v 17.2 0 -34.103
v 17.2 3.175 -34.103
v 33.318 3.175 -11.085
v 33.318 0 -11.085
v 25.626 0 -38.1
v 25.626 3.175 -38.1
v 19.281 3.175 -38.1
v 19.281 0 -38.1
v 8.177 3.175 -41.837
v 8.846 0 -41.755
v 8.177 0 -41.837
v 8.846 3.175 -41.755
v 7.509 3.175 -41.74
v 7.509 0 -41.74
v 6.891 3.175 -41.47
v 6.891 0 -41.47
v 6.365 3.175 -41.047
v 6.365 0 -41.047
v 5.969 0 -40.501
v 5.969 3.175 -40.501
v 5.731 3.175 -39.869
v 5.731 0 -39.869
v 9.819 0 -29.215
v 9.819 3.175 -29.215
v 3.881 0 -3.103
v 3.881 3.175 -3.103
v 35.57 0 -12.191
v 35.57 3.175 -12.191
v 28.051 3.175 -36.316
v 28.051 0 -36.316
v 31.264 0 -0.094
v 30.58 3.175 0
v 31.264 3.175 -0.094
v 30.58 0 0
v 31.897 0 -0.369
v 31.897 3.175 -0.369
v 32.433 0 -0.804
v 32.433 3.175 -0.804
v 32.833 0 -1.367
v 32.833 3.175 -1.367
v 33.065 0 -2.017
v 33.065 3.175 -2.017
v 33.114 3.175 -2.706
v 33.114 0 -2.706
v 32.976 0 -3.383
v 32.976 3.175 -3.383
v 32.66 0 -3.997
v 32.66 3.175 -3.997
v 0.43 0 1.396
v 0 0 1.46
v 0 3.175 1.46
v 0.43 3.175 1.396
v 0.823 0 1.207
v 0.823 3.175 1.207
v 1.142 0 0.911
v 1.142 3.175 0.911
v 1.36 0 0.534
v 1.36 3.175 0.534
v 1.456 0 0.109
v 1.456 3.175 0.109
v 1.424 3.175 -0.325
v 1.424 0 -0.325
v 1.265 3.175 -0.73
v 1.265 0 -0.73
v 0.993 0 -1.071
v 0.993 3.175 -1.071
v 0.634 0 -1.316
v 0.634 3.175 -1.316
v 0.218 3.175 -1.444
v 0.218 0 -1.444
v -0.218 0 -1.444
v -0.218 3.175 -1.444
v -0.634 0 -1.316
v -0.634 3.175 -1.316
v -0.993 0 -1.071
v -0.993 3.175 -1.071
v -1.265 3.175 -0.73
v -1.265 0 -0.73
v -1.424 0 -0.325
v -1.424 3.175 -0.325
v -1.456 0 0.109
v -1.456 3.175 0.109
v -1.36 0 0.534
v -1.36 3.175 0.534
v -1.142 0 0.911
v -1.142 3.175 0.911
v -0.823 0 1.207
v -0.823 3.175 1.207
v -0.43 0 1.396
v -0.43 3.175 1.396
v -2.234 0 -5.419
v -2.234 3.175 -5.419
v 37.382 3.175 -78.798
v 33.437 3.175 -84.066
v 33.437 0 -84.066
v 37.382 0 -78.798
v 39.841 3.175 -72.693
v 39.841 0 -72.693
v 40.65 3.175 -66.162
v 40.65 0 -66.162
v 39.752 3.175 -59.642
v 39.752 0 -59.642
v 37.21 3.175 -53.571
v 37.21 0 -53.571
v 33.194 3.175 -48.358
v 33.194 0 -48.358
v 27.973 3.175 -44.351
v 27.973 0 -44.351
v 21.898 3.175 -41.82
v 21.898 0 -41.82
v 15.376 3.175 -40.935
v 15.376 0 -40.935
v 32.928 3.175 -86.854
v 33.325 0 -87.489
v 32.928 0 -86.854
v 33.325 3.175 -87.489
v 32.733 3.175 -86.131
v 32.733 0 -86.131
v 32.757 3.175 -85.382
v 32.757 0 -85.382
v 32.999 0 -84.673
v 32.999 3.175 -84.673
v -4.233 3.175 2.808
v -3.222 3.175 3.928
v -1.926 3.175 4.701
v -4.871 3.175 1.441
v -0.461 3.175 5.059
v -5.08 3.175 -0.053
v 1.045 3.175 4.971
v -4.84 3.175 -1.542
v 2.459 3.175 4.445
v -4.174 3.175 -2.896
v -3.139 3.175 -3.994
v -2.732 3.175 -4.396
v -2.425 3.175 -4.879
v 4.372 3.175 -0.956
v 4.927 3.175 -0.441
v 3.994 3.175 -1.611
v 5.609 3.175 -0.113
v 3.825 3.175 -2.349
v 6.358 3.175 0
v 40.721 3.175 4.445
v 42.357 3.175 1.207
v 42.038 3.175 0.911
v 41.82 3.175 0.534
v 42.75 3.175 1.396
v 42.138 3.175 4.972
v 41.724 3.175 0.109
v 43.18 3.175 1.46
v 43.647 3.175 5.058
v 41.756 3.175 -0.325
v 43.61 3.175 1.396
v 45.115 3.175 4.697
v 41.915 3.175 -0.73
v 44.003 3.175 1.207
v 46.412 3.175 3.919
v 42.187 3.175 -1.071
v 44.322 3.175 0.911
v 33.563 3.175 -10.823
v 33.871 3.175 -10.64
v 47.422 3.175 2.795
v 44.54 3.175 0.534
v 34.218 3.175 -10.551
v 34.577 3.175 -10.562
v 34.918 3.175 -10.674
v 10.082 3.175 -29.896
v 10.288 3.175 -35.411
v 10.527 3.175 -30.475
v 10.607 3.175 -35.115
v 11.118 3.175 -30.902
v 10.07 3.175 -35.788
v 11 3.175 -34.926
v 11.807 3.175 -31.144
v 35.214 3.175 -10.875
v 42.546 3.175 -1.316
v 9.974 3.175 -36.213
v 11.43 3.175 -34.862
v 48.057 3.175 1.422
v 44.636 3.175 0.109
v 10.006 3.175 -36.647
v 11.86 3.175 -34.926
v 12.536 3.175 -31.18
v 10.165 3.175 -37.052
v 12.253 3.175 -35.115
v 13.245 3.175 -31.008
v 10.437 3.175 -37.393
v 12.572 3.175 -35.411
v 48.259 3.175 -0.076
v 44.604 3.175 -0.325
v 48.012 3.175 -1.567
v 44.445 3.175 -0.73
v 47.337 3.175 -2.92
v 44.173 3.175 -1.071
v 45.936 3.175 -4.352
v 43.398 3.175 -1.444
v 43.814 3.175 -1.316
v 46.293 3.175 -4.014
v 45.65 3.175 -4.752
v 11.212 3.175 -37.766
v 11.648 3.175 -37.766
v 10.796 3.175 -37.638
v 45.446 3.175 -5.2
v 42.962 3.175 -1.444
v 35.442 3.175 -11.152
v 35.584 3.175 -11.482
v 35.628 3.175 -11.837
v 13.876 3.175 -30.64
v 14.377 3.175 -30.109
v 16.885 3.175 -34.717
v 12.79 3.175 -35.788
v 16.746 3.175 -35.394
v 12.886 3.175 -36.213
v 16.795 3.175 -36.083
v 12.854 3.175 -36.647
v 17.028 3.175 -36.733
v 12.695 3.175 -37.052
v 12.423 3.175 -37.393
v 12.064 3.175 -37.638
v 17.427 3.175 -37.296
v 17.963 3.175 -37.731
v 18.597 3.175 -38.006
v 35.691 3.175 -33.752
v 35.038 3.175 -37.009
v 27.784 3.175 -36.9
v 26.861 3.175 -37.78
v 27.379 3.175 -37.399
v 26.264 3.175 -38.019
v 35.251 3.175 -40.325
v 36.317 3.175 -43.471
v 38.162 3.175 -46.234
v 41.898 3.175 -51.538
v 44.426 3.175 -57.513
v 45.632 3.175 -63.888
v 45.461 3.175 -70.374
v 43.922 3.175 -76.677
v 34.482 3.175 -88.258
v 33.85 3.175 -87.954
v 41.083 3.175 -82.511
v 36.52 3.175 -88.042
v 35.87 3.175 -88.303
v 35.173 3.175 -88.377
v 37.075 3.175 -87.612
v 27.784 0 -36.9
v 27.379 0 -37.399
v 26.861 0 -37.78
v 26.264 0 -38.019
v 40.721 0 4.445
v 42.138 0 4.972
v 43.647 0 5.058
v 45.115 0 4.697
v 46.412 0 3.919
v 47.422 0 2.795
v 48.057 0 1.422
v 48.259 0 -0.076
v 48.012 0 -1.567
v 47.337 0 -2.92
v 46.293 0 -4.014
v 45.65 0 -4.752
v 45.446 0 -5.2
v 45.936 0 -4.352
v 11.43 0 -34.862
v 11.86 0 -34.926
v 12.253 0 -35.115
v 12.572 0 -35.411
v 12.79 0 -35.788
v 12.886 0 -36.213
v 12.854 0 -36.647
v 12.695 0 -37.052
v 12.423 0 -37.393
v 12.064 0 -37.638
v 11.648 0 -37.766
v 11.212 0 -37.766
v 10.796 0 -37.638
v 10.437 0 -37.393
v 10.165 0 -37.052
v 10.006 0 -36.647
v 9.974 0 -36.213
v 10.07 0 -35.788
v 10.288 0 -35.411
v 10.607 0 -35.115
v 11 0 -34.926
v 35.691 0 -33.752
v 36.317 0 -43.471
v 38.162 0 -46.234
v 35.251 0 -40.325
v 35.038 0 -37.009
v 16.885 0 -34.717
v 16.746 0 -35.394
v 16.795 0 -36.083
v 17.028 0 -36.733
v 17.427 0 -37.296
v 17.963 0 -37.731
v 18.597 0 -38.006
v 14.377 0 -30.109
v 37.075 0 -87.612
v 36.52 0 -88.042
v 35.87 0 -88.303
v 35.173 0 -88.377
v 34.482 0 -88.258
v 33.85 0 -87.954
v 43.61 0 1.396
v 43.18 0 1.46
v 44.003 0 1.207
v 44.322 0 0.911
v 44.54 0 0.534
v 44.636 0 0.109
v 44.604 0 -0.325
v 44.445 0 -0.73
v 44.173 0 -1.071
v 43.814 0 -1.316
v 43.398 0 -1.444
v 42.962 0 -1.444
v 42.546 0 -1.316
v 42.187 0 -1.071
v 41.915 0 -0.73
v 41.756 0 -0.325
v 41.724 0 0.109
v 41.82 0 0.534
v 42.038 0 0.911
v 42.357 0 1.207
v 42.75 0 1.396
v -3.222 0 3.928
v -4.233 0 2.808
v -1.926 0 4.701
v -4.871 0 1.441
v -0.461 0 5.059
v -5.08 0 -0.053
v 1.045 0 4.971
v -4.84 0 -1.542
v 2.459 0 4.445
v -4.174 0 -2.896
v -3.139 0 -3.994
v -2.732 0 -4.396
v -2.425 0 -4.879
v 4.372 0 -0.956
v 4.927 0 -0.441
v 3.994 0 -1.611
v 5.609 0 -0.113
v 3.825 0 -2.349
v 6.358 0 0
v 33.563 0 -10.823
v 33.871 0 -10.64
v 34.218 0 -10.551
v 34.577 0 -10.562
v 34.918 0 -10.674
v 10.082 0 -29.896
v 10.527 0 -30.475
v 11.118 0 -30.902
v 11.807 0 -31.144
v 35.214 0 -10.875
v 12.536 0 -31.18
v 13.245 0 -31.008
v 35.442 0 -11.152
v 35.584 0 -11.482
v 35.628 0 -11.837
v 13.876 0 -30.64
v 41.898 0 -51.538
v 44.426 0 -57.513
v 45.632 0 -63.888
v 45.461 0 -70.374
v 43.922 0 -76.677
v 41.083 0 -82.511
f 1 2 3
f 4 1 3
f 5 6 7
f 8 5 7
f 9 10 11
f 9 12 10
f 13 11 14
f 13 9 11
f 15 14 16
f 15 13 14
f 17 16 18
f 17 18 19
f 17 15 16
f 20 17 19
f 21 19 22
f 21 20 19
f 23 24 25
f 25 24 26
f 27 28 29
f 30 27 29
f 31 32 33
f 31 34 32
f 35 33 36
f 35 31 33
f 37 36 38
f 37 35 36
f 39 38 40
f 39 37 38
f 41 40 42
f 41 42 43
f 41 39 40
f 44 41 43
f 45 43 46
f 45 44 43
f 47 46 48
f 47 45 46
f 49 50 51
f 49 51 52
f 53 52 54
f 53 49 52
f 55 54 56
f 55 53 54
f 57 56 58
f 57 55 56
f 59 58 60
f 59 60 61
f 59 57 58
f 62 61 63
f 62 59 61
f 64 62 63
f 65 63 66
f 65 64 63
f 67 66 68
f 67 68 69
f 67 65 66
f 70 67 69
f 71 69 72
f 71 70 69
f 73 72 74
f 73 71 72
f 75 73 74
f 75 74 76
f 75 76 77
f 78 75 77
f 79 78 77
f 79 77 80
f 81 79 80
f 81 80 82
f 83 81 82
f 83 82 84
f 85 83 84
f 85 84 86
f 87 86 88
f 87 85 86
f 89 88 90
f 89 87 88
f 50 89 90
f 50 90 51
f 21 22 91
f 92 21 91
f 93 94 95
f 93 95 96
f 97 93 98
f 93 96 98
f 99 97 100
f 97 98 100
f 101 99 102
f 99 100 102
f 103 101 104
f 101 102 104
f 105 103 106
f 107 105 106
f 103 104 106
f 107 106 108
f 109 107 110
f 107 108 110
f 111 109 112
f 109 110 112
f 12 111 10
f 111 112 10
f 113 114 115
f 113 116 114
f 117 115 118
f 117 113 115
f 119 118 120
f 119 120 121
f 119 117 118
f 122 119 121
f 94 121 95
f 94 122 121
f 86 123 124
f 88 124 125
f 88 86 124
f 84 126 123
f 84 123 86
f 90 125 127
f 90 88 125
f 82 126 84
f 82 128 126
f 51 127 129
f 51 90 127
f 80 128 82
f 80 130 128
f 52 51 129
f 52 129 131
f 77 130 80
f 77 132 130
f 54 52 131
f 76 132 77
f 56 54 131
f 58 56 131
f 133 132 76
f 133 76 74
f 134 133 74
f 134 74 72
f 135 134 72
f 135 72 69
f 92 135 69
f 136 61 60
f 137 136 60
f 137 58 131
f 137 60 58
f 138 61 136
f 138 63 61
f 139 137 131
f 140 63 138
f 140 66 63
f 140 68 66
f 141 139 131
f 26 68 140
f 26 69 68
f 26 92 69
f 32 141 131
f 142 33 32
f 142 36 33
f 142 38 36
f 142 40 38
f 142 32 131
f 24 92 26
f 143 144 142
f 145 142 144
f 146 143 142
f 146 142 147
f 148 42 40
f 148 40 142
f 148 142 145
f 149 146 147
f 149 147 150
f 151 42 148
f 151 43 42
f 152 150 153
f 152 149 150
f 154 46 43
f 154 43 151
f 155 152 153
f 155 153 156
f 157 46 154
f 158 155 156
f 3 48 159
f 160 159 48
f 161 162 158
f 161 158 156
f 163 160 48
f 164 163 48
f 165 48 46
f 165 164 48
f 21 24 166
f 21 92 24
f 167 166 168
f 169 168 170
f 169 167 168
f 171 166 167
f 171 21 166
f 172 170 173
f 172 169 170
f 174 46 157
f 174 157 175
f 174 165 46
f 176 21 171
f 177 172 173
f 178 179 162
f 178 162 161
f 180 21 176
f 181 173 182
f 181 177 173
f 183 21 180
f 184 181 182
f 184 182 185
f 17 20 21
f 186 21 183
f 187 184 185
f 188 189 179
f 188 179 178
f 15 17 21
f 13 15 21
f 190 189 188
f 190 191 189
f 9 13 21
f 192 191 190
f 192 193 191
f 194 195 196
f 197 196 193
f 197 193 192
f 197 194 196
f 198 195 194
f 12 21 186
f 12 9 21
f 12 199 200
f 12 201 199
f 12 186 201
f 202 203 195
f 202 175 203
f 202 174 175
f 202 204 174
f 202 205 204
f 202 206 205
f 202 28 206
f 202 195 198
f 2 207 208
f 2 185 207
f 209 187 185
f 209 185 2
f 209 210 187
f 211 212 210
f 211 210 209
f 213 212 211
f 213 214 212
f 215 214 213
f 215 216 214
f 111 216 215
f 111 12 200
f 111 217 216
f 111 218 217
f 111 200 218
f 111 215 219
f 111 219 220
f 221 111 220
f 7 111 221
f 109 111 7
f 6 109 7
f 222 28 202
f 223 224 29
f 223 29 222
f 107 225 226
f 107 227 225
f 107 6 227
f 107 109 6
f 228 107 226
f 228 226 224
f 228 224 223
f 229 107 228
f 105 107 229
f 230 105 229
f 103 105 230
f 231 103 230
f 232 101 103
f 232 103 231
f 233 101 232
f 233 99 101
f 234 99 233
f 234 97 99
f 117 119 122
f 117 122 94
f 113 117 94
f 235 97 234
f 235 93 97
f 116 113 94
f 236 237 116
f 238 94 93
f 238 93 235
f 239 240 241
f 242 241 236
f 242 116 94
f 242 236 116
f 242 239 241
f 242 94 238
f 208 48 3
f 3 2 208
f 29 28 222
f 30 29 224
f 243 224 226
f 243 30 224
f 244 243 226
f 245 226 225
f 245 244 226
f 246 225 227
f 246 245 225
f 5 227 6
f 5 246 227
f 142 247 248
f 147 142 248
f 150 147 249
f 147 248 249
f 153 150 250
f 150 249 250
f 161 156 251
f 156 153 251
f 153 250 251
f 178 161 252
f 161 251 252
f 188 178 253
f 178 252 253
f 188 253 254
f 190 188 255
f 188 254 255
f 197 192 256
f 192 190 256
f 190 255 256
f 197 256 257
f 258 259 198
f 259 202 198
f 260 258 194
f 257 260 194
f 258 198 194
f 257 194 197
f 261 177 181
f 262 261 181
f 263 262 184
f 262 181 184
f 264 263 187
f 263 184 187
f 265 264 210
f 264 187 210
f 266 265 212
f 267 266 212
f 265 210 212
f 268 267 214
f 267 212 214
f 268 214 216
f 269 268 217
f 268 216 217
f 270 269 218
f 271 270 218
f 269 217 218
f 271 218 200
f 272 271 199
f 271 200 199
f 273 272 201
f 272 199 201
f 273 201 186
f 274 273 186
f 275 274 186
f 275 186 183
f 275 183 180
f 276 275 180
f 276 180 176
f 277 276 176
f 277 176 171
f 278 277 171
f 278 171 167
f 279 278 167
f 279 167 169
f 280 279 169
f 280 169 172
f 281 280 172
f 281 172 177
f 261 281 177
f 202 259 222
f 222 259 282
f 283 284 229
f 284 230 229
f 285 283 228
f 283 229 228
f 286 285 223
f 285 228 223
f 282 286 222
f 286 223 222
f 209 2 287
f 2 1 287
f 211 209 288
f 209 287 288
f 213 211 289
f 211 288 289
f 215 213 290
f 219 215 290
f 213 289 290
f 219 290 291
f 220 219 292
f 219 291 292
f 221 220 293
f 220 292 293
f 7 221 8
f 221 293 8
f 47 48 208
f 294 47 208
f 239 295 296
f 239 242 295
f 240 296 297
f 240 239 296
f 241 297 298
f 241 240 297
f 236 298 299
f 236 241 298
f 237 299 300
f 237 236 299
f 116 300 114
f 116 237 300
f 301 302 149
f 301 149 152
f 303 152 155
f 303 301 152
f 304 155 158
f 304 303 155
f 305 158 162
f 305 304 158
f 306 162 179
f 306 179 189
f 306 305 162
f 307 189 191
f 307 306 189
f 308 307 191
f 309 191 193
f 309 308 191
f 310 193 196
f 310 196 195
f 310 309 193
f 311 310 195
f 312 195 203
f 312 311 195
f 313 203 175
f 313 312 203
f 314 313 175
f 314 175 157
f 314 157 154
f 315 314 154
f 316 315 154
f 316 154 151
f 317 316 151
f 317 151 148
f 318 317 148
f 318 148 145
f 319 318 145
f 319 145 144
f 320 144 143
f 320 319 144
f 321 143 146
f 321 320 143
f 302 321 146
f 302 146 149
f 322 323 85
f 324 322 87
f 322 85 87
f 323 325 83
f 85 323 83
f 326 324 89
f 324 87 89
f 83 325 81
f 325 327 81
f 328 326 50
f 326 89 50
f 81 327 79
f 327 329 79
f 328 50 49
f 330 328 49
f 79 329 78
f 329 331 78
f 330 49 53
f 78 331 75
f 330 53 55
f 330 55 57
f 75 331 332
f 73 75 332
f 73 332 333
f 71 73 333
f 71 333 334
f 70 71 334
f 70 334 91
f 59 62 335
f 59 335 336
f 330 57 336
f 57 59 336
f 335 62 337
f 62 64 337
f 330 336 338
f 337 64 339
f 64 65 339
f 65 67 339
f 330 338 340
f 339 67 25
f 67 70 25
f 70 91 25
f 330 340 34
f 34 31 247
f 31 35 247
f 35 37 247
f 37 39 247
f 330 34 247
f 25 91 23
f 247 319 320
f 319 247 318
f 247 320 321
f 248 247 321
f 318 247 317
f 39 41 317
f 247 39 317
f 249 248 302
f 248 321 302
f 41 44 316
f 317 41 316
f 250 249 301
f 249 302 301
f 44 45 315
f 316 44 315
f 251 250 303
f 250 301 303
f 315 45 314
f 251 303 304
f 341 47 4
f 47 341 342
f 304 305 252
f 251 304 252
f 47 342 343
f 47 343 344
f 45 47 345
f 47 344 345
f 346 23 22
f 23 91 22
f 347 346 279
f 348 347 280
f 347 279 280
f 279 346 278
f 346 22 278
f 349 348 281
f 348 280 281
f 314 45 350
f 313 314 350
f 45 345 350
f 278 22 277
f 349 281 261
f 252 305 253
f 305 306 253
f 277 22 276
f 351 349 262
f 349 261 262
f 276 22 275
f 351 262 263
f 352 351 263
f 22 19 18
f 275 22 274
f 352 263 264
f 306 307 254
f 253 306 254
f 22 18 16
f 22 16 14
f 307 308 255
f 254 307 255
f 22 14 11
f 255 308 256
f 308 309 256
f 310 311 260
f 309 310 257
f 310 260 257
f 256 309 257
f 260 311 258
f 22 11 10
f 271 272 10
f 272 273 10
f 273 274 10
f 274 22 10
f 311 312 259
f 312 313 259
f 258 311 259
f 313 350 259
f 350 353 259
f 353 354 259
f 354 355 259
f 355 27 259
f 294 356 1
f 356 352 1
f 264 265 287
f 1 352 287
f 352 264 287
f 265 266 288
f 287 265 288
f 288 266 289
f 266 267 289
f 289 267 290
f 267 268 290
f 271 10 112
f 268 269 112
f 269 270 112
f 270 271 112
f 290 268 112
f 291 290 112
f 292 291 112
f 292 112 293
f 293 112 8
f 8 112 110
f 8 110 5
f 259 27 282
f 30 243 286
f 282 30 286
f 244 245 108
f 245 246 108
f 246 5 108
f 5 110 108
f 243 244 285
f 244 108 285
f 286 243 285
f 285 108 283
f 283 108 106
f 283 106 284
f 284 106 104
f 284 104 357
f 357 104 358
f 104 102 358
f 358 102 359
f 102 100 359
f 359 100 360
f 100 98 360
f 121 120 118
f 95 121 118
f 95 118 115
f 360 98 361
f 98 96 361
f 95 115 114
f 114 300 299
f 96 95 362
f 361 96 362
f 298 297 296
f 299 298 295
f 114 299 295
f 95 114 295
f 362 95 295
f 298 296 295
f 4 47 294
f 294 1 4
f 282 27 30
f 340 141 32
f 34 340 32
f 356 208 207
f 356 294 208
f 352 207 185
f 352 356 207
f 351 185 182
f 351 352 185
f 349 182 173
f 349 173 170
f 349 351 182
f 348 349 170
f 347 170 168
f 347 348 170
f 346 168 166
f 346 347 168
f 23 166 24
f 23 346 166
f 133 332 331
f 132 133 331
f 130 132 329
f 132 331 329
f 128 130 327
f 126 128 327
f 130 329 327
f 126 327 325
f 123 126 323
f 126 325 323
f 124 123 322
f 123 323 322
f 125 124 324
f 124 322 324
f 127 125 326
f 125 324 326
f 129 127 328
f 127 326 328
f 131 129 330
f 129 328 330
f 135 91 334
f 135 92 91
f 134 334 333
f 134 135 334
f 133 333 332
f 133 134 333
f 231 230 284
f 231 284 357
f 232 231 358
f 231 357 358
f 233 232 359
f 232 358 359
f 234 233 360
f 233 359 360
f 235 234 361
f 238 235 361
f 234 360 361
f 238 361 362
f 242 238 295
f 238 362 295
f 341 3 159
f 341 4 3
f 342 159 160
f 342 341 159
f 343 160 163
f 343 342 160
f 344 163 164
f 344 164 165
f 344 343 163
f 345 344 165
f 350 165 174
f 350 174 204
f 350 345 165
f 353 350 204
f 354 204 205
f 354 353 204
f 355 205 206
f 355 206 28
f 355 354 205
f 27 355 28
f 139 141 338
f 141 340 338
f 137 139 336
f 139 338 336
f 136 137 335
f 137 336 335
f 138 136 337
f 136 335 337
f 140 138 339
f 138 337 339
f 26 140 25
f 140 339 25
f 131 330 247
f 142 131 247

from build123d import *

# Parameters (mm, degrees)
SKETCH1_R           = 5.08
SKETCH1_R_2         = 1.4605
BOSS_EXTRUDE1_DEPTH = 3.175
BOSS_EXTRUDE3_START = -3.175
BOSS_EXTRUDE3_DEPTH = 3.175
CUT_EXTRUDE1_DEPTH  = 25.4
FILLET4_R           = 2.54
FILLET5_R           = 12.7
FILLET6_R           = 2.54
FILLET7_R           = 1.27
SKETCH5_R           = 1.4605
CUT_EXTRUDE2_DEPTH  = 25.4


with BuildPart() as part:
    # Sketch1 → Boss-Extrude1 (new body)
    # profile 1 of 3: a face of its own
    with BuildSketch(Plane(origin=(0, 0, 0), x_dir=(1, 0, 0), z_dir=(0, 1, 0))):
        Circle(SKETCH1_R)
        with Locations(Location((0, 0, 0), (0, 0, 270))):
            Circle(SKETCH1_R_2, mode=Mode.SUBTRACT)
    # profile 2 of 3: a face of its own
    with BuildSketch(Plane(origin=(0, 0, 0), x_dir=(1, 0, 0), z_dir=(0, 1, 0))):
        with BuildLine():
            Line((40.720655575, 4.445), (2.459344425, 4.445))
            ThreePointArc((2.459344425, 4.445), (4.376063852, 2.580012628), (5.08, 0))
            ThreePointArc((5.08, 0), (4.376063852, -2.580012628), (2.459344425, -4.445))
            Line((2.459344425, -4.445), (40.720655575, -4.445))
            ThreePointArc((40.720655575, -4.445), (38.1, 0), (40.720655575, 4.445))
        make_face()
    # profile 3 of 3: a face of its own
    with BuildSketch(Plane(origin=(0, 0, 0), x_dir=(1, 0, 0), z_dir=(0, 1, 0))):
        with Locations((43.18, 0)):
            Circle(SKETCH1_R)
        with Locations(Location((43.18, 0, 0), (0, 0, 270))):
            Circle(SKETCH1_R_2, mode=Mode.SUBTRACT)
    extrude(amount=BOSS_EXTRUDE1_DEPTH)

    # Sketch3 → Boss-Extrude3 (add)
    with BuildSketch(Plane(origin=(0, 3.175, 0), x_dir=(1, 0, 0), z_dir=(0, 1, 0)).offset(BOSS_EXTRUDE3_START)):
        with BuildLine():
            Line((35.04998037, 89.507820887), (31.75, 85.645628562))
            ThreePointArc((31.75, 85.645628562), (37.132860765, 53.438748965), (6.35, 42.545))
            Line((6.35, 42.545), (-2.459344425, 4.445))
            ThreePointArc((-2.459344425, 4.445), (0, 5.08), (2.459344425, 4.445))
            Line((2.459344425, 4.445), (35.640655575, 4.445))
            Line((35.640655575, 4.445), (40.720655575, 4.445))
            ThreePointArc((40.720655575, 4.445), (43.226324552, 5.079788779), (45.72, 4.399409051))
            Line((45.72, 4.399409051), (33.02, 41.570560083))
            ThreePointArc((33.02, 41.570560083), (45.702805946, 65.04509807), (35.04998037, 89.507820887))
        make_face()
    extrude(amount=BOSS_EXTRUDE3_DEPTH)

    # Sketch4 → Cut-Extrude1 (cut)
    with BuildSketch(Plane(origin=(0, 3.175, 0), x_dir=(1, 0, 0), z_dir=(0, 1, 0))):
        Polygon((14.401426857, 38.1), (37.998834682, 4.399409051), (27.495360016, 38.1), align=None)
        Polygon((3.175, 0), (35.458834682, 0), (11.089851742, 34.802514411), align=None)
    extrude(amount=-CUT_EXTRUDE1_DEPTH, mode=Mode.SUBTRACT)

    # Fillet4
    fillet4_edges = [part.edges().sort_by_distance(p)[0] for p in [
        (11.089851742, 1.5875, -34.802514411),
        (35.458834682, 1.5875, 0),
        (3.175, 1.5875, 0),
        (14.401426857, 1.5875, -38.1),
        (27.495360016, 1.5875, -38.1),
    ]]
    fillet(fillet4_edges, radius=FILLET4_R)

    # Fillet5
    fillet5_edges = [part.edges().sort_by_distance(p)[0] for p in [
        (33.02, 1.5875, -41.570560083),
    ]]
    fillet(fillet5_edges, radius=FILLET5_R)

    # Fillet6
    fillet6_edges = [part.edges().sort_by_distance(p)[0] for p in [
        (6.35, 1.5875, -42.545),
        (35.04998037, 1.5875, -89.507820887),
        (31.75, 1.5875, -85.645628562),
        (-2.459344425, 1.5875, -4.445),
        (45.72, 1.5875, -4.399409051),
    ]]
    fillet(fillet6_edges, radius=FILLET6_R - 0.0001)  # a hair under: the kernel refuses the full size

    # Fillet7
    fillet7_edges = [part.edges().sort_by_distance(p)[0] for p in [
        (37.998834682, 1.5875, -4.399409051),
    ]]
    fillet(fillet7_edges, radius=FILLET7_R)

    # Sketch5 → Cut-Extrude2 (cut)
    with BuildSketch(Plane(origin=(0, 3.175, 0), x_dir=(1, 0, 0), z_dir=(0, 1, 0))):
        with Locations(Location((11.43, 36.322, 0), (0, 0, 270))):
            Circle(SKETCH5_R)
    extrude(amount=-CUT_EXTRUDE2_DEPTH, mode=Mode.SUBTRACT)


solid = part.part
